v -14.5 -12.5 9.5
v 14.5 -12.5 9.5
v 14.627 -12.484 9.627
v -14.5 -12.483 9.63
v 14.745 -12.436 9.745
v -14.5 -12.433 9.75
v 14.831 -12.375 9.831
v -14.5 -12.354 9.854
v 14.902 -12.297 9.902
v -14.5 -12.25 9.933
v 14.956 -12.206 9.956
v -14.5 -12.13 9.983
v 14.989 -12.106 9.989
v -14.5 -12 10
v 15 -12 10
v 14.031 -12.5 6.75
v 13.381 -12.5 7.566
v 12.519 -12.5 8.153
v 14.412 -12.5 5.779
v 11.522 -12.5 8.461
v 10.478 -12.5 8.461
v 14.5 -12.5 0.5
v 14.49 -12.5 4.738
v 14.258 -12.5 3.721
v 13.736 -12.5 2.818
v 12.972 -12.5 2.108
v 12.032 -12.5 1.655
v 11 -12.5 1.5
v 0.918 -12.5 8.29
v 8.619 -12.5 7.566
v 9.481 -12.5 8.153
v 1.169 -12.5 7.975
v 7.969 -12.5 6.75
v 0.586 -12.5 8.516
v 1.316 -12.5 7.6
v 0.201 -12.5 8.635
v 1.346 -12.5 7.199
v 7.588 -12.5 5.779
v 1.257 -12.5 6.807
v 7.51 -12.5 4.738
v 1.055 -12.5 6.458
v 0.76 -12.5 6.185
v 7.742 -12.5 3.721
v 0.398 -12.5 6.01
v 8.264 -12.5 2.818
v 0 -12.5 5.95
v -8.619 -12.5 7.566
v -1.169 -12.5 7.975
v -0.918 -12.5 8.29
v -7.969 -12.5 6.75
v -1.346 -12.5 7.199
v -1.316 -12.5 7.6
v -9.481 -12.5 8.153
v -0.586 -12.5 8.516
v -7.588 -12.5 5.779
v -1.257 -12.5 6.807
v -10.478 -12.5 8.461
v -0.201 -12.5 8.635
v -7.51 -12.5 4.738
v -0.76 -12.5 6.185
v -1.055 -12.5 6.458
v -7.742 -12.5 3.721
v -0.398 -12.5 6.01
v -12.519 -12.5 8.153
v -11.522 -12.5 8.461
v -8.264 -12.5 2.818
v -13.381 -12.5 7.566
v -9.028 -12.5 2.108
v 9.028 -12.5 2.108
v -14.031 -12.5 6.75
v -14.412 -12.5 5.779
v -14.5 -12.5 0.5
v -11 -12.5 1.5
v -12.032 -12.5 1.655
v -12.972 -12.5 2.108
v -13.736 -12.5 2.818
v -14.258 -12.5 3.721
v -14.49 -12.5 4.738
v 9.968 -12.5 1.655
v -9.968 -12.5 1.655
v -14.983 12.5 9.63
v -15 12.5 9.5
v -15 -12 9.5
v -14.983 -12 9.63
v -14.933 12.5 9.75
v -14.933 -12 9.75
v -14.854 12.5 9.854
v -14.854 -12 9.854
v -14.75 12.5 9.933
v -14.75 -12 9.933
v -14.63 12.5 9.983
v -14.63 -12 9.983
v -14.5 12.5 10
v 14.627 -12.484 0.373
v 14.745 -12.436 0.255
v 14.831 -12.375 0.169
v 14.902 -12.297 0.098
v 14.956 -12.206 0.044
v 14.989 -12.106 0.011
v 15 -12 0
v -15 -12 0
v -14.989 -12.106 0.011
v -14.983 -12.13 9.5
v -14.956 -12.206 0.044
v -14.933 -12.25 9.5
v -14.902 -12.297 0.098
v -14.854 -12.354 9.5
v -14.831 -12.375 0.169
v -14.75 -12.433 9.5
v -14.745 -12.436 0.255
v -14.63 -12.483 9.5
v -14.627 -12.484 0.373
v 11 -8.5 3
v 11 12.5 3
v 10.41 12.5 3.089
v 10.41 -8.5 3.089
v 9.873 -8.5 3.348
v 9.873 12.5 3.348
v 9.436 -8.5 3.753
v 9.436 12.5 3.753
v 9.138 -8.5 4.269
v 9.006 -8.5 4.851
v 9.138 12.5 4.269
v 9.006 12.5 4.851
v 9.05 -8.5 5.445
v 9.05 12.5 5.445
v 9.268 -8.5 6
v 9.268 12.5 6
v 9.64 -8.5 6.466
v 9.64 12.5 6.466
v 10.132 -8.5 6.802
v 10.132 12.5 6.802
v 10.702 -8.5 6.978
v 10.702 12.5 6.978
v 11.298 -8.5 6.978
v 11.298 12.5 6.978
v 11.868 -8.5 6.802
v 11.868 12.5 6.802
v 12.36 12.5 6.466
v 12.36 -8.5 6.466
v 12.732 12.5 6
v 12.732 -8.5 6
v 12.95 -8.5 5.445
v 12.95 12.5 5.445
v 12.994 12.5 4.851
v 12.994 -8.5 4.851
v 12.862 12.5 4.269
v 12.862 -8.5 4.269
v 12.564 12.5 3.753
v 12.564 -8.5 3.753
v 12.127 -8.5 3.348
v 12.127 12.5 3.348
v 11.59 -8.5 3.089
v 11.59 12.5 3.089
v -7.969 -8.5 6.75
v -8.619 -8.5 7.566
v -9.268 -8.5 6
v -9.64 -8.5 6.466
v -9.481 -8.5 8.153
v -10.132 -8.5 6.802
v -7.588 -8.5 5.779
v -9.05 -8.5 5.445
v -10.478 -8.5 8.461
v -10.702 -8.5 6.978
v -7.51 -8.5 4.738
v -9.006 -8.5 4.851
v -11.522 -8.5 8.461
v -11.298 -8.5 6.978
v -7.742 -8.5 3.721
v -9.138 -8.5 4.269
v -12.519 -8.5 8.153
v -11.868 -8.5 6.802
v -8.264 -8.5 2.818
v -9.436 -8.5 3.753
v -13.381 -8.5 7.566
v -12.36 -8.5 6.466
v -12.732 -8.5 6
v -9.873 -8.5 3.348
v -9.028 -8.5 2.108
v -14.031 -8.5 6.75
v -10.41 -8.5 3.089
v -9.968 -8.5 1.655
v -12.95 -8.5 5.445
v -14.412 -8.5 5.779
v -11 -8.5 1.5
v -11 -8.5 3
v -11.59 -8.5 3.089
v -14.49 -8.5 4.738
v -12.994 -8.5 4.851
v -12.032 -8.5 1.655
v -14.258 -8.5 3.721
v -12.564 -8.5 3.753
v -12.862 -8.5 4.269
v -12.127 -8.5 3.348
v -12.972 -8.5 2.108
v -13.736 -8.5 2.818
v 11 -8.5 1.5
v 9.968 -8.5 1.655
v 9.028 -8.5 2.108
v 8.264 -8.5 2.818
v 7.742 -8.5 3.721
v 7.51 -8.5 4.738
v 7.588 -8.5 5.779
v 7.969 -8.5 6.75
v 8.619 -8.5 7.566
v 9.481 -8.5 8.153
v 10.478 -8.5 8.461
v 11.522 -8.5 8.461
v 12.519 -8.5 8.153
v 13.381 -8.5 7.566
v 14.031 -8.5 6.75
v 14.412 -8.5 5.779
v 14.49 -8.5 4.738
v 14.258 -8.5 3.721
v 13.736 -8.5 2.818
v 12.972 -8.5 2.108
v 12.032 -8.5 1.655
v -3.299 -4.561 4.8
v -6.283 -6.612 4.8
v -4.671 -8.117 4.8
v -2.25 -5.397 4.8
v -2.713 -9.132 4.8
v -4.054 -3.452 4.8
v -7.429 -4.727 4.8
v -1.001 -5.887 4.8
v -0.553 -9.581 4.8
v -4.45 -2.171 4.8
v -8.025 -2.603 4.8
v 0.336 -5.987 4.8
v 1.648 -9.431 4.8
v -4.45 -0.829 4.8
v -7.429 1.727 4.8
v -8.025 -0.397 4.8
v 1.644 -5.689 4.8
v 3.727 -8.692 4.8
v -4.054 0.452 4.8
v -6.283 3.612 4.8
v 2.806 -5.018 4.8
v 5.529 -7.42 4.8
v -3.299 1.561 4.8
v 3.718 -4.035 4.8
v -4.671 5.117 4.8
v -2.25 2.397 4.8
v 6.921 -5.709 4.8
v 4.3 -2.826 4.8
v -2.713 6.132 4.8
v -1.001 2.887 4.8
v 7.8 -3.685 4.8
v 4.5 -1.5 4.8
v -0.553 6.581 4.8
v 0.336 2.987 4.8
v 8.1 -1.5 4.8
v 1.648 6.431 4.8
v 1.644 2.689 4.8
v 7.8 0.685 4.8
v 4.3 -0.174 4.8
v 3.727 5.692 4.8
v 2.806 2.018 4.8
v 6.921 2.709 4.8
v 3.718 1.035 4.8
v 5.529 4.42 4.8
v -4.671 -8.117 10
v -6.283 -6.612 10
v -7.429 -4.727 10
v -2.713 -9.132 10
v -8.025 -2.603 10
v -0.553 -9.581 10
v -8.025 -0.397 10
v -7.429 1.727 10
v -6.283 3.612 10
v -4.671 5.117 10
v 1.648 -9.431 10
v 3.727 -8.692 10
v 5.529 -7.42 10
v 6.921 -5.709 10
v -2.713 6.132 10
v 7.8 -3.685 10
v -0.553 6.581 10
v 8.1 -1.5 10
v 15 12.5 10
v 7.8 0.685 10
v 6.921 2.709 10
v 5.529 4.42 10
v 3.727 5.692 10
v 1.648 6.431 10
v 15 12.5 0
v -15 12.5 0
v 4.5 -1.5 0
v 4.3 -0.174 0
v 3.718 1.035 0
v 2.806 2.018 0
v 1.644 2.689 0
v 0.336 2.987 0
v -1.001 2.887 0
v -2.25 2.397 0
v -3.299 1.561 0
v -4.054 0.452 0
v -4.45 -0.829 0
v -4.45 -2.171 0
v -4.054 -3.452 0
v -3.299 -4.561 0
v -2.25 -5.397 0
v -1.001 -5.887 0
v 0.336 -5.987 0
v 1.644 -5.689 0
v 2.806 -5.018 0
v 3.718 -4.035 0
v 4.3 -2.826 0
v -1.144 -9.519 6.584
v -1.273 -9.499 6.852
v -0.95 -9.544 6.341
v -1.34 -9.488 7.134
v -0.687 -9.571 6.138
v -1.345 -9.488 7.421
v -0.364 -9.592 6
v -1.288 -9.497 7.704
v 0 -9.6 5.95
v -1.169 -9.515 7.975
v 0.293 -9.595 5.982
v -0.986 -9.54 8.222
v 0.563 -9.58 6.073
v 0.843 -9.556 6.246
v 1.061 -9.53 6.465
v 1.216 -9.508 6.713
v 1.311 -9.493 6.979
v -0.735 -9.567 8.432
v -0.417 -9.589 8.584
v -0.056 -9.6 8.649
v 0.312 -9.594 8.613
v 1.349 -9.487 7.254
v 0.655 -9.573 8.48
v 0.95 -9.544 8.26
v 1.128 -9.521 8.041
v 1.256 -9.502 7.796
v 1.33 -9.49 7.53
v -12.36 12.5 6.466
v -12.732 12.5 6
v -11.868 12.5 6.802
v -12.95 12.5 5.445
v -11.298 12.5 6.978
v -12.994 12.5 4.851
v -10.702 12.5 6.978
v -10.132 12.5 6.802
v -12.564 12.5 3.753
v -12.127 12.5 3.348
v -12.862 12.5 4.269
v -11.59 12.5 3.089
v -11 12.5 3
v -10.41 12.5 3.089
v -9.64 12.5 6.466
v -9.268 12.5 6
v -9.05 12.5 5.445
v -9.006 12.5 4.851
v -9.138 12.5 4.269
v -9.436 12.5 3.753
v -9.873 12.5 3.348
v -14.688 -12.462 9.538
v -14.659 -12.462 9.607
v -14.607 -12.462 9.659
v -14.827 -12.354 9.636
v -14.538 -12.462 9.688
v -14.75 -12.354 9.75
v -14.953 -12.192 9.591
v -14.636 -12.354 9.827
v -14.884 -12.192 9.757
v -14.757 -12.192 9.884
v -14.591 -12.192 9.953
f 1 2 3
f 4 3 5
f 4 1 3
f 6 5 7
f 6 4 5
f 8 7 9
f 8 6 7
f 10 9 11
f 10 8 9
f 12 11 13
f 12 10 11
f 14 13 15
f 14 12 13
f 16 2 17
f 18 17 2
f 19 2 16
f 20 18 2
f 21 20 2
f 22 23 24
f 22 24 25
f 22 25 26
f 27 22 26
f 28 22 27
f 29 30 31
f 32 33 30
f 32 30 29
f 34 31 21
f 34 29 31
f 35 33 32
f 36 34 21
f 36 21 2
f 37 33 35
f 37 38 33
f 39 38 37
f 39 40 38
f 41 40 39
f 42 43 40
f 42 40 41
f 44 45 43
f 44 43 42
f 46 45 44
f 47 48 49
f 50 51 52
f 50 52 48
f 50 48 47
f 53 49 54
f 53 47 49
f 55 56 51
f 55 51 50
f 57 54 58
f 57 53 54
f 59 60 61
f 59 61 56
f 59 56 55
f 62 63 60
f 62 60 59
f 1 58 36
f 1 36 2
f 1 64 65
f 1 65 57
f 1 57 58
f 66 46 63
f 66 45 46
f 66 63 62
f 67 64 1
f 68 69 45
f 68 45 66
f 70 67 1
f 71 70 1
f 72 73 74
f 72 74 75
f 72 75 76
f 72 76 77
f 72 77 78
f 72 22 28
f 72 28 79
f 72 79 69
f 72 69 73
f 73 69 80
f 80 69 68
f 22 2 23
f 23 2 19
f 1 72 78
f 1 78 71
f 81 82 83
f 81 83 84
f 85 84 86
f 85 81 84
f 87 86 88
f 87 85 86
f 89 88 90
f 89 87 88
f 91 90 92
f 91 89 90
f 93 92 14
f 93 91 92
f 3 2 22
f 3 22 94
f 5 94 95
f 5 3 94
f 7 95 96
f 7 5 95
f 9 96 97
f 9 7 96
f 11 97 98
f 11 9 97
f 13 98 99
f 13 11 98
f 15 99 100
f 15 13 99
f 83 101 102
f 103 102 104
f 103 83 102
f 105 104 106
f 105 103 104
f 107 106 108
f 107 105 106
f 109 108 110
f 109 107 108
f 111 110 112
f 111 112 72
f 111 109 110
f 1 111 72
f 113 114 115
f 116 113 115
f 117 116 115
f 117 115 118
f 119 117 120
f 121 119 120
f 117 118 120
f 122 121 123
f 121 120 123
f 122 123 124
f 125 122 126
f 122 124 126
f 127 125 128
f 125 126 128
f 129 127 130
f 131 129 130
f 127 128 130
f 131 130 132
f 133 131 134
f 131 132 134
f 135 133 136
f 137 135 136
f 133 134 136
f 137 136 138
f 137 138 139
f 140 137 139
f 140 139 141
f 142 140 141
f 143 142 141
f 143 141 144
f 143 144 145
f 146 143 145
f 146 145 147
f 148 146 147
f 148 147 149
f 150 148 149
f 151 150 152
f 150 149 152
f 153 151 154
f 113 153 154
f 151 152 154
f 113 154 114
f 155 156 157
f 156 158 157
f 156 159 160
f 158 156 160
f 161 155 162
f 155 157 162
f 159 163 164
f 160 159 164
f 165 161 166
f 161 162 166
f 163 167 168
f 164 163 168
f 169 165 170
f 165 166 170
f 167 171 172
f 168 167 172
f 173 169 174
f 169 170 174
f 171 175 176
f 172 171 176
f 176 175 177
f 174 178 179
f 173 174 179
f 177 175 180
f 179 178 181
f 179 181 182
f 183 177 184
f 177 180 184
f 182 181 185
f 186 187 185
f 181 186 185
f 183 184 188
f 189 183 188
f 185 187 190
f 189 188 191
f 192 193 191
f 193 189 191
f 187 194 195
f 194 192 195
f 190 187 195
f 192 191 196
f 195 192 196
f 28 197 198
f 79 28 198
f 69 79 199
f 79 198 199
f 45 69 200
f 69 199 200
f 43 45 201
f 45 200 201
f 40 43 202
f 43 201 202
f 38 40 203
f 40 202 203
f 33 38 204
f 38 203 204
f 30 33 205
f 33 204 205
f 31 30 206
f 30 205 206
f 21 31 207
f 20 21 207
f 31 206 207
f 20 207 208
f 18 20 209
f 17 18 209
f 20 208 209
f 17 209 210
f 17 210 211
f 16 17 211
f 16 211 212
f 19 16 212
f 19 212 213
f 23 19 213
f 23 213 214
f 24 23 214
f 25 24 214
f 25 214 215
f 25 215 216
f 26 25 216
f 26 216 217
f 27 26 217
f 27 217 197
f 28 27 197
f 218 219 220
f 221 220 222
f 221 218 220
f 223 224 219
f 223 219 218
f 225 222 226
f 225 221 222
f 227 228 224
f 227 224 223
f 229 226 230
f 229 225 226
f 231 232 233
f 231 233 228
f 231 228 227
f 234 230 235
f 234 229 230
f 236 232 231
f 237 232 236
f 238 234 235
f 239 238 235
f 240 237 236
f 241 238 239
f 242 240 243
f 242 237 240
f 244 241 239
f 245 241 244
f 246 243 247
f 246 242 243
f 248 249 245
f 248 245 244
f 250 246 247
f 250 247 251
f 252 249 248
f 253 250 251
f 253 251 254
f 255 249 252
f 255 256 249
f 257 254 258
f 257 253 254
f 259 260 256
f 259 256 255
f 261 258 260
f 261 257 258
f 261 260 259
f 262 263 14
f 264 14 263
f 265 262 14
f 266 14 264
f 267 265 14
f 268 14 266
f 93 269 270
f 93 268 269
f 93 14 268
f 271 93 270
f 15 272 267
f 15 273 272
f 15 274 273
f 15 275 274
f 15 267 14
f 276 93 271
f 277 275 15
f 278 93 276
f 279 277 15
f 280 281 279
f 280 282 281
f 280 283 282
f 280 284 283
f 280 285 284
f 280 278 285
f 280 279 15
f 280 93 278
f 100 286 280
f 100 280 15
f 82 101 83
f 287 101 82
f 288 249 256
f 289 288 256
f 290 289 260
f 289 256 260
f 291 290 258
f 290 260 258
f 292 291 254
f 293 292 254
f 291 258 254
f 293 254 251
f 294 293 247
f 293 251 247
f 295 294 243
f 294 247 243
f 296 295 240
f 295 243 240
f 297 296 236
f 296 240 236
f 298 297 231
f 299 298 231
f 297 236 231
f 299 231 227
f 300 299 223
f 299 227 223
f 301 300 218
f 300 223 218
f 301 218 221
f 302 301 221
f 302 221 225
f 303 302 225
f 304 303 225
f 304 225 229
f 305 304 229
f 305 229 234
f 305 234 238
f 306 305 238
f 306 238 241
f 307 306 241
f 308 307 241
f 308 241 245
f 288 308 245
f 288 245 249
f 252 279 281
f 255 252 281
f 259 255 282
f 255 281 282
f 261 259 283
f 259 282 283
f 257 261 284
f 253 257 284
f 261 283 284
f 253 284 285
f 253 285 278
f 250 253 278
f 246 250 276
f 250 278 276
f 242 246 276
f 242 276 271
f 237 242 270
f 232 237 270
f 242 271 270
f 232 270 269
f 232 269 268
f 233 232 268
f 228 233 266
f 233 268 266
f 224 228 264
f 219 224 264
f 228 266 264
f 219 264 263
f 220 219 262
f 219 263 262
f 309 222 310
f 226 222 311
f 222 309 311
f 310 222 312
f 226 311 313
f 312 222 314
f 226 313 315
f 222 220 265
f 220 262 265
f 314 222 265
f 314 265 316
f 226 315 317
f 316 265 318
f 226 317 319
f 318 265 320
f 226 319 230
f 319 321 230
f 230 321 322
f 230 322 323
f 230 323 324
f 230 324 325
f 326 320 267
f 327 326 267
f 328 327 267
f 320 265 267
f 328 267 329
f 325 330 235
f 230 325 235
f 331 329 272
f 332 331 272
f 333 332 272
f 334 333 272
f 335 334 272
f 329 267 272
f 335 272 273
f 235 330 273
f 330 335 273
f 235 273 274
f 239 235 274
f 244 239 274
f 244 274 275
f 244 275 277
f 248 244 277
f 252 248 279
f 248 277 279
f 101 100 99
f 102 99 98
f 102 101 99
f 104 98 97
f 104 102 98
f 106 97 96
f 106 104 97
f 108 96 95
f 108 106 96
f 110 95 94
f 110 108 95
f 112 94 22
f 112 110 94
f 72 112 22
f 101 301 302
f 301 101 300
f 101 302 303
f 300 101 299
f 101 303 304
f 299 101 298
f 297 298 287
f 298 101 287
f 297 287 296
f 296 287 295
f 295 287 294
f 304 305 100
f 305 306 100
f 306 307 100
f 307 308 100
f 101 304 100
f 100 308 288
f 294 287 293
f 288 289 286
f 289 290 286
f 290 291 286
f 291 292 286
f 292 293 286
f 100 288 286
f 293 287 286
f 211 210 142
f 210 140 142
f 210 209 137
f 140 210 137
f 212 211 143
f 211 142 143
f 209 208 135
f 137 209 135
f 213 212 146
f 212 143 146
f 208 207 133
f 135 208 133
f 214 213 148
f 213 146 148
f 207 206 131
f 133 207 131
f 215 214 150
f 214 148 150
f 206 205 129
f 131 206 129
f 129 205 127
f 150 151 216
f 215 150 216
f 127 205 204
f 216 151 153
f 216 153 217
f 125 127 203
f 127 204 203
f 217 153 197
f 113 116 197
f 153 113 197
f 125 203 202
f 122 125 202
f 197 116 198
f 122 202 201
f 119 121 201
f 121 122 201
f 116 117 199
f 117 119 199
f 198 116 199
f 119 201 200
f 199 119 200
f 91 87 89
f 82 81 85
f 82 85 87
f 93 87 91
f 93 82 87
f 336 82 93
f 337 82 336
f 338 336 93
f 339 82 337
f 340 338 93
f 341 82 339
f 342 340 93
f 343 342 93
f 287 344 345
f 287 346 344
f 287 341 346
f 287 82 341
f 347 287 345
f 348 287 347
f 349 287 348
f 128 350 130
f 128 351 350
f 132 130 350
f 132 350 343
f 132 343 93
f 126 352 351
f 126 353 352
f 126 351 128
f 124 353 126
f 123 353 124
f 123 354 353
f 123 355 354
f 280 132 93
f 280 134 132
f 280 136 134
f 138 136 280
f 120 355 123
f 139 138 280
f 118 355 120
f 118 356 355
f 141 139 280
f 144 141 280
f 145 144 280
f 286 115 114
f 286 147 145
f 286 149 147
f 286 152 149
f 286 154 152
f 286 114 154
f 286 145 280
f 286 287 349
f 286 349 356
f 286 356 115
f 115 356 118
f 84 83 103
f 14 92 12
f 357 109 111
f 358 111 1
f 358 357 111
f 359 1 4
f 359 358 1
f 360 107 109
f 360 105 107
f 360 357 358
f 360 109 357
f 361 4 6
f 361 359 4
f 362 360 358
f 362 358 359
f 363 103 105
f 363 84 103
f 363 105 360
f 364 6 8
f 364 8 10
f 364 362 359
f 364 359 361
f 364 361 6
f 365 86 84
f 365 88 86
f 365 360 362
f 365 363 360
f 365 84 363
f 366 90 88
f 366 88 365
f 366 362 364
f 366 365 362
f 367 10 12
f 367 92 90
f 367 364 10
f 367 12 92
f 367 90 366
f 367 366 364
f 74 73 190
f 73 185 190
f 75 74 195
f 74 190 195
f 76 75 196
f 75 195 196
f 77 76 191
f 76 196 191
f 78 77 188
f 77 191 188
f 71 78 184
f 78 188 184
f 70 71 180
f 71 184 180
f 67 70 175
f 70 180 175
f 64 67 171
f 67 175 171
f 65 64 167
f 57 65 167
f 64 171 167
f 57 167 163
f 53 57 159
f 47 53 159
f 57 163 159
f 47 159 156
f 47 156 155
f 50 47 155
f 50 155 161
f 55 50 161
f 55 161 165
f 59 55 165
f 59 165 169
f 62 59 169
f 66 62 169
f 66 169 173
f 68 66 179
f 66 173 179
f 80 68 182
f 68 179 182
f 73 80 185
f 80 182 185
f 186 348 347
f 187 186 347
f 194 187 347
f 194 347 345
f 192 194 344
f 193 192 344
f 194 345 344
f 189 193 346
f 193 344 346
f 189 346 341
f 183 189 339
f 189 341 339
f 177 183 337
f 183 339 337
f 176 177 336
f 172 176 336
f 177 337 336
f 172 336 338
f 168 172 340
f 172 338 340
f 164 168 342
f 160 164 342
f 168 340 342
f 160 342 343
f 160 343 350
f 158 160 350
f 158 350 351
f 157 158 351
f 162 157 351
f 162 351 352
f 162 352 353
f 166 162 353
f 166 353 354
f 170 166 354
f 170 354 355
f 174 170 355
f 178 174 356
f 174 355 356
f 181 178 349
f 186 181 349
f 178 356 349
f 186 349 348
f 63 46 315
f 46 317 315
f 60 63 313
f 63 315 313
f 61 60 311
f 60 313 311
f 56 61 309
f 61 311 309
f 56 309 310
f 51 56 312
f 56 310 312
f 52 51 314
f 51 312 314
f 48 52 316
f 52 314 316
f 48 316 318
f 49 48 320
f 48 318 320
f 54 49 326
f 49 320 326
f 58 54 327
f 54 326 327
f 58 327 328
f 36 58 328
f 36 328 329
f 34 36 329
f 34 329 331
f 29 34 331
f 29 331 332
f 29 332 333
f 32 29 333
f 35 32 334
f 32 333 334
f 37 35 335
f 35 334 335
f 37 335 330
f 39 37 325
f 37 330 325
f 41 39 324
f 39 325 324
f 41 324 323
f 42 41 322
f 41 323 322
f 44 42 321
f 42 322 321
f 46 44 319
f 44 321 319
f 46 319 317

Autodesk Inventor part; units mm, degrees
ref_plane "YZ Plane" through (0, 0, 0) normal (1, 0, 0) x (0, 1, 0)
ref_plane "XZ Plane" through (0, 0, 0) normal (0, 1, 0) x (-1, 0, 0)
ref_plane "XY Plane" through (0, 0, 0) normal (0, 0, 1) x (1, 0, 0)
sketch "Sketch1" plane through (0, 0, 0) normal (0, 0, 1) x (1, 0, 0)
  line L0 (-15, 12.5) -> (15, 12.5)
  line L1 (15, 12.5) -> (15, -12.5)
  line L2 (15, -12.5) -> (-15, -12.5)
  line L3 (-15, -12.5) -> (-15, 12.5)
  line L4 (-15, 12.5) -> (15, -12.5) construction
  line L5 (15, 12.5) -> (-15, -12.5) construction
  point P0 (0, 0)
  dimension "d14" = 6
  dimension "d0" = 30
  dimension "d10" = 25
extrude "Extrusion1" add sketch "Sketch1" along normal blind 10
sketch "Sketch2" plane through (0, 0, 10) normal (0, 0, 1) x (1, 0, 0)
  circle A0 centre (0, -1.5) radius 8.1
  line L0 (15, 12.5) -> (-15, 12.5) projected
  point P0 (0, 12.5)
  dimension "d4" = 16.2
  dimension "d38" = 14
extrude "Extrusion2" cut sketch "Sketch2" against normal blind 5.2
sketch "Sketch3" plane through (0, -1.5, 4.8) normal (0, 0, 1) x (1, 0, 0)
  circle A0 centre (0, 0) radius 4.5
  circle A1 centre (0, 0) radius 8.1 projected
  dimension "d7" = 9
extrude "Extrusion3" cut sketch "Sketch3" against normal blind 5.2 contours A0
sketch "Sketch4" plane through (-15, -12.5, 0) normal (0, -1, 0) x (1, 0, 0)
  line L0 (0, 0) -> (0, 10) projected
  line L1 (0, 10) -> (30, 10) projected
  point P0 (15, 0)
  point P1 (4, 5)
  dimension "d11" = 4
  dimension "d12" = 5
hole "Hole1" at (-11, -12.5, 5) direction (0, 1, 0) diameter 4 end through all counterbore diameter 7 counterbore depth 4
sketch "Sketch5" plane through (-15, -12.5, 0) normal (0, -1, 0) x (1, 0, 0)
  line L0 (30, 0) -> (30, 10) projected
  line L1 (0, 10) -> (30, 10) projected
  point P0 (15, 0)
  point P1 (26, 5)
  dimension "d20" = 4
  dimension "d21" = 5
hole "Hole2" at (11, -12.5, 5) direction (0, 1, 0) diameter 4 end through all counterbore diameter 7 counterbore depth 4
sketch "Sketch6" plane through (-15, -12.5, 0) normal (0, -1, 0) x (1, 0, 0)
  line L0 (0, 10) -> (30, 10) projected
  line L1 (30, 0) -> (30, 10) projected
  point P0 (15, 0)
  point P1 (15, 7.3)
  dimension "d29" = 2.7
  dimension "d30" = 15
hole "Hole3" at (0, -12.5, 7.3) direction (0, 1, 0) diameter 2.7 depth 8 tip angle 118
fillet "Fillet2" radius 0.5 5 edges at (-15, 0, 10) (0, -12.5, 0) (15, -12.5, 5) (-15, -12.5, 5) (0, -12.5, 10)
properties part number "wheel_holder"
